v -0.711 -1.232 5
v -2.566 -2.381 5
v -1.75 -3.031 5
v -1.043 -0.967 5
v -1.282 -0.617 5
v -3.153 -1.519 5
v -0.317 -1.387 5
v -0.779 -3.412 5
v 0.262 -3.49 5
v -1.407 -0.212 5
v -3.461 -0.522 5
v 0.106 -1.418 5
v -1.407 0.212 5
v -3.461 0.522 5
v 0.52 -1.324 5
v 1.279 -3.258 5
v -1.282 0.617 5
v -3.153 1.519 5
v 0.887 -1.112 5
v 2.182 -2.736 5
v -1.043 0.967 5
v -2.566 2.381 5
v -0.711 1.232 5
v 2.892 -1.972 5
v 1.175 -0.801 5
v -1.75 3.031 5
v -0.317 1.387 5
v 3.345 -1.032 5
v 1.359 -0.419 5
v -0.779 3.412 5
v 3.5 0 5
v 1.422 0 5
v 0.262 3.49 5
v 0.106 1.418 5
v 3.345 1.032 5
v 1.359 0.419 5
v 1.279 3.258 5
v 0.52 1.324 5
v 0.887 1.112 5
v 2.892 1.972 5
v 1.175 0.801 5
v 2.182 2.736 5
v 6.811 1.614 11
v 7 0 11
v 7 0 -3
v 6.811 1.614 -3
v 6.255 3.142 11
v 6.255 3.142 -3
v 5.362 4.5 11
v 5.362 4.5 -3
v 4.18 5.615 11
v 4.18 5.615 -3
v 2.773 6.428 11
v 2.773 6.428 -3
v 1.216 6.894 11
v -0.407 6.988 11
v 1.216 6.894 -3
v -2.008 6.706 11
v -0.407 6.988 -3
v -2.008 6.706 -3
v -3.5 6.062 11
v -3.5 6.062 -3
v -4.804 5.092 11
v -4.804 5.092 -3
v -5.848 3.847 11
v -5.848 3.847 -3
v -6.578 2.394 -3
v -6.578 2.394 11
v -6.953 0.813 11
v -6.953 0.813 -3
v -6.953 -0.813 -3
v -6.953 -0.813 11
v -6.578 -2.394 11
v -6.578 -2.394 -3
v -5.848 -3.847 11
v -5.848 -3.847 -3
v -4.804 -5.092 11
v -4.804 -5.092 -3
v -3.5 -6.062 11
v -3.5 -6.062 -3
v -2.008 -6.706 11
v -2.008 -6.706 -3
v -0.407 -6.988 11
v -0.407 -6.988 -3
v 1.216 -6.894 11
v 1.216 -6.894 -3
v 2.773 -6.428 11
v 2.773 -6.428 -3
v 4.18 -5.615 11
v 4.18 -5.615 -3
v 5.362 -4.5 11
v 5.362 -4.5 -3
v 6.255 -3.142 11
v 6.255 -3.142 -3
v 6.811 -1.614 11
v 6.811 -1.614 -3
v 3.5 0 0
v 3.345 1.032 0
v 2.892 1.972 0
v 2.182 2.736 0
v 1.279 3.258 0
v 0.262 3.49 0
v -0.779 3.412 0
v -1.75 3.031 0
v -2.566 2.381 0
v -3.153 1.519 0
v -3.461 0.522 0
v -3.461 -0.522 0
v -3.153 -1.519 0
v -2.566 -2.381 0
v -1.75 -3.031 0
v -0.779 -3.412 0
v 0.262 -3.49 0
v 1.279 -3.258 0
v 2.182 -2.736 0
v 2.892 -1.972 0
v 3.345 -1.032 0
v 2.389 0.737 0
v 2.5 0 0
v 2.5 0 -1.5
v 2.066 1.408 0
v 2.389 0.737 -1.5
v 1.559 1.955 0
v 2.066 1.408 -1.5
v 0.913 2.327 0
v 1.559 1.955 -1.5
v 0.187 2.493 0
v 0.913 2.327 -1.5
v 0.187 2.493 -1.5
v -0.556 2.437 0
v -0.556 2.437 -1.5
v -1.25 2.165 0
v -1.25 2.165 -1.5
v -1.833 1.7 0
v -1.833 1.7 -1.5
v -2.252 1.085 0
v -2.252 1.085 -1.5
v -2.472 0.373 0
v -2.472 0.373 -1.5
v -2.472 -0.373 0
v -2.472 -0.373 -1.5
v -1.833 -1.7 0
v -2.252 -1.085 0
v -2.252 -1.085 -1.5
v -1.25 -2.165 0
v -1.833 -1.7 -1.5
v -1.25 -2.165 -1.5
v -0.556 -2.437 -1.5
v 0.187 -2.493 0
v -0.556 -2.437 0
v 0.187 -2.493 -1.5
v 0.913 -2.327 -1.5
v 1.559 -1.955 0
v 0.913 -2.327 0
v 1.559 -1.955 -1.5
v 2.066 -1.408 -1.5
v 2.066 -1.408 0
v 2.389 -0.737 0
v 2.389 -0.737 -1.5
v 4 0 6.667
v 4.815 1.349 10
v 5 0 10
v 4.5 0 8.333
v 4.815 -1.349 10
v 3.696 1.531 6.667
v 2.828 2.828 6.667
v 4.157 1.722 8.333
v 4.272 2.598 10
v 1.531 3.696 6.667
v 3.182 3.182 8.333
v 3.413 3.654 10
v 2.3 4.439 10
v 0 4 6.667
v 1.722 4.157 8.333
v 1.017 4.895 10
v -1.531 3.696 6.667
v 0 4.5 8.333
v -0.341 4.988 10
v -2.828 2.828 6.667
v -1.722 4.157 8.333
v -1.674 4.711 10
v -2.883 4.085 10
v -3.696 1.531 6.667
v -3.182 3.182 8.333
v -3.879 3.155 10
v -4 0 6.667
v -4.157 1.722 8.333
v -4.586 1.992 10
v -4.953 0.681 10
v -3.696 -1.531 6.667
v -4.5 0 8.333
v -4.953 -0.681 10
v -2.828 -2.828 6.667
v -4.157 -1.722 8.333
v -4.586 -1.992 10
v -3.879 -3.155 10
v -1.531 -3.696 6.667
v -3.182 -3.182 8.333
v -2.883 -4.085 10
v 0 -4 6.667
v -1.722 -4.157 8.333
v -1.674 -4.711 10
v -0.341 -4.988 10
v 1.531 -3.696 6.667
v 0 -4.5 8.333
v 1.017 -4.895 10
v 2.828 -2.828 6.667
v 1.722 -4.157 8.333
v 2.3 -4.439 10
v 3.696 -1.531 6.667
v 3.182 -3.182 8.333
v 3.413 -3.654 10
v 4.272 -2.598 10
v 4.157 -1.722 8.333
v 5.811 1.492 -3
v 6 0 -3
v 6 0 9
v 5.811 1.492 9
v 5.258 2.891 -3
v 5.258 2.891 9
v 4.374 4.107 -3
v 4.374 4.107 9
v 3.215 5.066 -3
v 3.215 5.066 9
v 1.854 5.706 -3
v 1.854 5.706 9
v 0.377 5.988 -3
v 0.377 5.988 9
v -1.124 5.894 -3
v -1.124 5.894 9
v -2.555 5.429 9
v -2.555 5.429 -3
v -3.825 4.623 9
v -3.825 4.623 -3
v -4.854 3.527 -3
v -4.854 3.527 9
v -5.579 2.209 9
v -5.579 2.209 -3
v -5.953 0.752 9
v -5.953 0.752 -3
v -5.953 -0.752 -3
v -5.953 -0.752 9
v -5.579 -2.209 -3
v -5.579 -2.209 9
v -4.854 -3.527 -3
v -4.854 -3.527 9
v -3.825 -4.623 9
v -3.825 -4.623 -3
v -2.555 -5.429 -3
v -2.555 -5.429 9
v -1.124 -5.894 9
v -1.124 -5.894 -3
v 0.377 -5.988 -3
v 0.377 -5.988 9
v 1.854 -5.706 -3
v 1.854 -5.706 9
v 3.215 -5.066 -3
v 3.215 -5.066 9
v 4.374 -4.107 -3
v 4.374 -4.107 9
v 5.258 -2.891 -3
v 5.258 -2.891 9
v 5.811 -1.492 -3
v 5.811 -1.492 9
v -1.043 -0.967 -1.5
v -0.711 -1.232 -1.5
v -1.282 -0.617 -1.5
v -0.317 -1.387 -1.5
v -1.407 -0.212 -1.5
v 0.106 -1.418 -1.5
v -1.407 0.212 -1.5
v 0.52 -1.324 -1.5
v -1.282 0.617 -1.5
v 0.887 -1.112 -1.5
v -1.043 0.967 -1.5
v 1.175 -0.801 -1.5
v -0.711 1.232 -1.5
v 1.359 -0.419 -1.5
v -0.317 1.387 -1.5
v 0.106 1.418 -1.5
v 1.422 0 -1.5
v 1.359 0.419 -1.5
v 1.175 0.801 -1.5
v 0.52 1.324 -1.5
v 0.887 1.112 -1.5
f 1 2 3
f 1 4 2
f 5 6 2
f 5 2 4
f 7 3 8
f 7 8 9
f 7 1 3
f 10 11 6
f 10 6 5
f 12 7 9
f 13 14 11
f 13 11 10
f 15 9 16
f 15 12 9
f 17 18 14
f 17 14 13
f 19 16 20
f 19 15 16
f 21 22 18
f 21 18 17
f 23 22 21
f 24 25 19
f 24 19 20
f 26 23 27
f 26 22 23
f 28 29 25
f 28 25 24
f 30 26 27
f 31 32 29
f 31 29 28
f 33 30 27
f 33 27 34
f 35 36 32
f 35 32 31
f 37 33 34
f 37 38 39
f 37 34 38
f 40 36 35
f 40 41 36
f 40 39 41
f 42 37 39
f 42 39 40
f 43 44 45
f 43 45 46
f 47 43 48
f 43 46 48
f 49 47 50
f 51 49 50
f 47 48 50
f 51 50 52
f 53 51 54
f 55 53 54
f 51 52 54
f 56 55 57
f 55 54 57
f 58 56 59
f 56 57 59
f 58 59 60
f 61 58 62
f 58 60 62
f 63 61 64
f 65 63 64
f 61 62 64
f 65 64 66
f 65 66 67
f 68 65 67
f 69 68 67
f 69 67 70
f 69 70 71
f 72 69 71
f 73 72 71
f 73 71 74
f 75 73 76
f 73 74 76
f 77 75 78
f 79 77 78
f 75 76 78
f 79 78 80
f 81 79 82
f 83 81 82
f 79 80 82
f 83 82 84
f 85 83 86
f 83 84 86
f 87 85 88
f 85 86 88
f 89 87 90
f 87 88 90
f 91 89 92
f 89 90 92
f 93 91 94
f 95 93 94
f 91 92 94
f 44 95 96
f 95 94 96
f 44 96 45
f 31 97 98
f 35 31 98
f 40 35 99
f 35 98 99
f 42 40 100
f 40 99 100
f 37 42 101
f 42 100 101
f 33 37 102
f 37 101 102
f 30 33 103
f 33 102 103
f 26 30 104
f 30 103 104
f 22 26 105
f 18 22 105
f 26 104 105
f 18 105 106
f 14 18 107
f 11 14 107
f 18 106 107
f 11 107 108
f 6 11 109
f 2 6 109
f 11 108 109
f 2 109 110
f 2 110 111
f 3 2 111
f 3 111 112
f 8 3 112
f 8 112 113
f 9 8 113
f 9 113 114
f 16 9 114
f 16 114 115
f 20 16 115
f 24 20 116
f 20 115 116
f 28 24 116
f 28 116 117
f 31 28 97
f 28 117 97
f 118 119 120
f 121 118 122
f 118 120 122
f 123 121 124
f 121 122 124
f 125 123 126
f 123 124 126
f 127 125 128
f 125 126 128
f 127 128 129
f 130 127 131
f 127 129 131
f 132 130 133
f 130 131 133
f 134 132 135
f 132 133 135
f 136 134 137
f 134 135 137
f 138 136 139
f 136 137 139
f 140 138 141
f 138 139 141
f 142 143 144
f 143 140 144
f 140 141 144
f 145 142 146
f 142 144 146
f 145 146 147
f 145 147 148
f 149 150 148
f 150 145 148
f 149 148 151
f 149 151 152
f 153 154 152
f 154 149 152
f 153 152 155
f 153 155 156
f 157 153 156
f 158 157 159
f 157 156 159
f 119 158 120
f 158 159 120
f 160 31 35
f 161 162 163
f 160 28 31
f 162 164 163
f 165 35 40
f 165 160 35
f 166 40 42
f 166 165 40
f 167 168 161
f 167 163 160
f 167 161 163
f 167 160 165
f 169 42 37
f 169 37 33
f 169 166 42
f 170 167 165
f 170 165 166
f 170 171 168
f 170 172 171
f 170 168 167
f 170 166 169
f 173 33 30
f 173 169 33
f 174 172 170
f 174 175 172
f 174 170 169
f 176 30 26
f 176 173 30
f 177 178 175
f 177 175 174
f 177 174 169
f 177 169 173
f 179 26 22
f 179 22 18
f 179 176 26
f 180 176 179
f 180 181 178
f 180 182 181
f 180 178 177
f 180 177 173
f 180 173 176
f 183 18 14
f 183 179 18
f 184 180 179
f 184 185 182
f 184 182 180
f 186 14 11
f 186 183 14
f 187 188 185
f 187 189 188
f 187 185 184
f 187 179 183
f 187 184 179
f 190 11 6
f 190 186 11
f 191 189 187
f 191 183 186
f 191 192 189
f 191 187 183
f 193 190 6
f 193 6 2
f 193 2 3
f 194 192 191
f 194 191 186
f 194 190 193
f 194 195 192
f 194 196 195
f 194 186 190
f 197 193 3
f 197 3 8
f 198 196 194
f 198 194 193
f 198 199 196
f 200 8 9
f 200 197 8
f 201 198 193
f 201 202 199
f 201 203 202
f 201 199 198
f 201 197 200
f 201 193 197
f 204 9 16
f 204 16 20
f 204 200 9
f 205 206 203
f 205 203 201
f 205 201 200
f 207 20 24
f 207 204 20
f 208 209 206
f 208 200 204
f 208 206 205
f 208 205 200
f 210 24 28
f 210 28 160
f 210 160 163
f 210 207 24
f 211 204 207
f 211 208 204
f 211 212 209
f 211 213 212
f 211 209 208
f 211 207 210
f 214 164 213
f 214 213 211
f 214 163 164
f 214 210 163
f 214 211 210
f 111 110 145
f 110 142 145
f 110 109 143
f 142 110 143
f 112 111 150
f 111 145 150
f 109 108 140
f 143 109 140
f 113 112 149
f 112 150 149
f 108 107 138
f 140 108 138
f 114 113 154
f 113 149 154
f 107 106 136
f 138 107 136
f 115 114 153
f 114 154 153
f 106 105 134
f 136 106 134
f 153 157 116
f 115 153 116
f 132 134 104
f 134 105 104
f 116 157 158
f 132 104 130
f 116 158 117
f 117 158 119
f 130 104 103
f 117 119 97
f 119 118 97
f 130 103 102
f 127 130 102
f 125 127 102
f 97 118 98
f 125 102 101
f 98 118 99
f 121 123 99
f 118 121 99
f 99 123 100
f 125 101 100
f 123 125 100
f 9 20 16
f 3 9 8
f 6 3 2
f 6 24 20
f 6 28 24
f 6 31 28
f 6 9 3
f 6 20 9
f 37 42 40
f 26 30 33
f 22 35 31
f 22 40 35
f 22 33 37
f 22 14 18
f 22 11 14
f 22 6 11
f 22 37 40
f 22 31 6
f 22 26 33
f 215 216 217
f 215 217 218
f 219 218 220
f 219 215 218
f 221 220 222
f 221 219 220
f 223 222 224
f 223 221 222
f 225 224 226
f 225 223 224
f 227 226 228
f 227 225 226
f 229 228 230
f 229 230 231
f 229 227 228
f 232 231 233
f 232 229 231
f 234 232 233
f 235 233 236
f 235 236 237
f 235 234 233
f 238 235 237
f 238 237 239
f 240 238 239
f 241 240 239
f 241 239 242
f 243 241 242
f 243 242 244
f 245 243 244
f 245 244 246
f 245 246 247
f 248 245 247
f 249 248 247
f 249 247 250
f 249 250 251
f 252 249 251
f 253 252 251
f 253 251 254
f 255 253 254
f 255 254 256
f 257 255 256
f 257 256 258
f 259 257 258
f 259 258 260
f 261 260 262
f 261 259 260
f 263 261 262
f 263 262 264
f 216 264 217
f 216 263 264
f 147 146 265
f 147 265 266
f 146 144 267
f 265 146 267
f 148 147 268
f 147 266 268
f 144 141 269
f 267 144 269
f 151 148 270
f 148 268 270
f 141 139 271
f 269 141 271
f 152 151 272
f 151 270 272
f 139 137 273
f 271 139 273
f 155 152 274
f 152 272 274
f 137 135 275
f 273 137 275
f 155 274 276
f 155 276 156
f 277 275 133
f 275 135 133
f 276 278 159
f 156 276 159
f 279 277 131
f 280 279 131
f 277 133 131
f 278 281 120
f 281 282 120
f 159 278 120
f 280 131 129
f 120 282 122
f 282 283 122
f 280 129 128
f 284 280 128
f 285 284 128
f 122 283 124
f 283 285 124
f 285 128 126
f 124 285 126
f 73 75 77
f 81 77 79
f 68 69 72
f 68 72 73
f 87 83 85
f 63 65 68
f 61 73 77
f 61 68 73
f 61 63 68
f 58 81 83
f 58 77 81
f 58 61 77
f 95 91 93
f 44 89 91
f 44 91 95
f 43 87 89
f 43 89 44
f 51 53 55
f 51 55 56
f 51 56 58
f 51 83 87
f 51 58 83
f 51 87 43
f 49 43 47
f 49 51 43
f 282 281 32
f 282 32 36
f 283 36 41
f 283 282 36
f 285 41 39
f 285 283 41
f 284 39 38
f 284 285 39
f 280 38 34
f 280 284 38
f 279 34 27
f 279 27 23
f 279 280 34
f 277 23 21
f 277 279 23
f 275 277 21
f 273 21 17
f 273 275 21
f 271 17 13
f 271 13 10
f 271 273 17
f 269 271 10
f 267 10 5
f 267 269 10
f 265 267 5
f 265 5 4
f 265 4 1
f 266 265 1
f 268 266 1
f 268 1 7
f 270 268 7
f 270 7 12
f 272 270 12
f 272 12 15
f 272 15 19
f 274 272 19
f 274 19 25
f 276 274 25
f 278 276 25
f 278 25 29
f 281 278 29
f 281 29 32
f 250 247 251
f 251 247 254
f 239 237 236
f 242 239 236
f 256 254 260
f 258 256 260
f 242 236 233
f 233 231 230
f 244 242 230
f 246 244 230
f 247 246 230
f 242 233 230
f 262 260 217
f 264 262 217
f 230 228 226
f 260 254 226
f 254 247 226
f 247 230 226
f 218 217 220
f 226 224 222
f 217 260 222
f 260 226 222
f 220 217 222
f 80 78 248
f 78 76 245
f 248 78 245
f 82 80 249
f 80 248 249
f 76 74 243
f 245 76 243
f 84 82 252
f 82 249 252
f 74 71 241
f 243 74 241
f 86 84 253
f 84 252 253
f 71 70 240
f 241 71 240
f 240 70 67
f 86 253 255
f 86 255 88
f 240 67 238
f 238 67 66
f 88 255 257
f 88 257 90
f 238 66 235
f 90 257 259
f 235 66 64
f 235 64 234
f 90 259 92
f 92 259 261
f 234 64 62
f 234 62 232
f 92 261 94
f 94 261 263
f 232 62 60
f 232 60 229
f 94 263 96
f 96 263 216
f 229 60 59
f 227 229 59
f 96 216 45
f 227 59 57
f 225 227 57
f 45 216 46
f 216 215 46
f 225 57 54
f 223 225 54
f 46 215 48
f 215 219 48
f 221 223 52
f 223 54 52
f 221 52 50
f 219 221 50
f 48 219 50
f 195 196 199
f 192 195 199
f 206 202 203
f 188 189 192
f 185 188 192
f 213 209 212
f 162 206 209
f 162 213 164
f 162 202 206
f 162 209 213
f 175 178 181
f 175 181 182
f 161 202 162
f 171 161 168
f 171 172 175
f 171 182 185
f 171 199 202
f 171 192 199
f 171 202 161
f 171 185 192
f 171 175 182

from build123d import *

# Parameters (mm, degrees)
CYLINDER_R        = 1.4224
CYLINDER_DEPTH    = 8
CYLINDER001_R     = 3.5
CYLINDER001_DEPTH = 5
CYLINDER002_R     = 2.5
CYLINDER002_DEPTH = 5
CYLINDER004_R     = 6
CYLINDER004_DEPTH = 20
CYLINDER003_R     = 7
CYLINDER003_DEPTH = 14


with BuildPart() as cone:
    # Cone → Cone (revolve)
    with BuildSketch(Plane(origin=(0, 0, 5), x_dir=(1, 0, 0), z_dir=(0, -1, 0))):
        Polygon((0, 0), (3.5, 0), (5, 5), (0, 5), align=None)
    revolve(axis=Axis((0, 0, 5), (0, 0, 1)))


with BuildPart() as cylinder:
    # Cylinder → Cylinder (new body)
    with BuildSketch(Plane.XY.offset(-3)):
        Circle(CYLINDER_R)
    extrude(amount=CYLINDER_DEPTH)


with BuildPart() as cylinder001:
    # Cylinder001 → Cylinder001 (new body)
    with BuildSketch(Plane.XY):
        Circle(CYLINDER001_R)
    extrude(amount=CYLINDER001_DEPTH)


with BuildPart() as cut:
    # Cylinder002 → Cylinder002 (new body)
    with BuildSketch(Plane.XY.offset(-1.5)):
        Circle(CYLINDER002_R)
    extrude(amount=CYLINDER002_DEPTH)

    # Fusion: union Cylinder001
    add(cylinder001.part)

    # Cut: cut Cylinder
    add(cylinder.part, mode=Mode.SUBTRACT)


with BuildPart() as cylinder004:
    # Cylinder004 → Cylinder004 (new body)
    with BuildSketch(Plane.XY.offset(-11)):
        Circle(CYLINDER004_R)
    extrude(amount=CYLINDER004_DEPTH)


with BuildPart() as cut001:
    # Cylinder003 → Cylinder003 (new body)
    with BuildSketch(Plane.XY.offset(-3)):
        Circle(CYLINDER003_R)
    extrude(amount=CYLINDER003_DEPTH)

    # Cut001: cut Cylinder004
    add(cylinder004.part, mode=Mode.SUBTRACT)


solid = Compound([cone.part, cut.part, cut001.part])
